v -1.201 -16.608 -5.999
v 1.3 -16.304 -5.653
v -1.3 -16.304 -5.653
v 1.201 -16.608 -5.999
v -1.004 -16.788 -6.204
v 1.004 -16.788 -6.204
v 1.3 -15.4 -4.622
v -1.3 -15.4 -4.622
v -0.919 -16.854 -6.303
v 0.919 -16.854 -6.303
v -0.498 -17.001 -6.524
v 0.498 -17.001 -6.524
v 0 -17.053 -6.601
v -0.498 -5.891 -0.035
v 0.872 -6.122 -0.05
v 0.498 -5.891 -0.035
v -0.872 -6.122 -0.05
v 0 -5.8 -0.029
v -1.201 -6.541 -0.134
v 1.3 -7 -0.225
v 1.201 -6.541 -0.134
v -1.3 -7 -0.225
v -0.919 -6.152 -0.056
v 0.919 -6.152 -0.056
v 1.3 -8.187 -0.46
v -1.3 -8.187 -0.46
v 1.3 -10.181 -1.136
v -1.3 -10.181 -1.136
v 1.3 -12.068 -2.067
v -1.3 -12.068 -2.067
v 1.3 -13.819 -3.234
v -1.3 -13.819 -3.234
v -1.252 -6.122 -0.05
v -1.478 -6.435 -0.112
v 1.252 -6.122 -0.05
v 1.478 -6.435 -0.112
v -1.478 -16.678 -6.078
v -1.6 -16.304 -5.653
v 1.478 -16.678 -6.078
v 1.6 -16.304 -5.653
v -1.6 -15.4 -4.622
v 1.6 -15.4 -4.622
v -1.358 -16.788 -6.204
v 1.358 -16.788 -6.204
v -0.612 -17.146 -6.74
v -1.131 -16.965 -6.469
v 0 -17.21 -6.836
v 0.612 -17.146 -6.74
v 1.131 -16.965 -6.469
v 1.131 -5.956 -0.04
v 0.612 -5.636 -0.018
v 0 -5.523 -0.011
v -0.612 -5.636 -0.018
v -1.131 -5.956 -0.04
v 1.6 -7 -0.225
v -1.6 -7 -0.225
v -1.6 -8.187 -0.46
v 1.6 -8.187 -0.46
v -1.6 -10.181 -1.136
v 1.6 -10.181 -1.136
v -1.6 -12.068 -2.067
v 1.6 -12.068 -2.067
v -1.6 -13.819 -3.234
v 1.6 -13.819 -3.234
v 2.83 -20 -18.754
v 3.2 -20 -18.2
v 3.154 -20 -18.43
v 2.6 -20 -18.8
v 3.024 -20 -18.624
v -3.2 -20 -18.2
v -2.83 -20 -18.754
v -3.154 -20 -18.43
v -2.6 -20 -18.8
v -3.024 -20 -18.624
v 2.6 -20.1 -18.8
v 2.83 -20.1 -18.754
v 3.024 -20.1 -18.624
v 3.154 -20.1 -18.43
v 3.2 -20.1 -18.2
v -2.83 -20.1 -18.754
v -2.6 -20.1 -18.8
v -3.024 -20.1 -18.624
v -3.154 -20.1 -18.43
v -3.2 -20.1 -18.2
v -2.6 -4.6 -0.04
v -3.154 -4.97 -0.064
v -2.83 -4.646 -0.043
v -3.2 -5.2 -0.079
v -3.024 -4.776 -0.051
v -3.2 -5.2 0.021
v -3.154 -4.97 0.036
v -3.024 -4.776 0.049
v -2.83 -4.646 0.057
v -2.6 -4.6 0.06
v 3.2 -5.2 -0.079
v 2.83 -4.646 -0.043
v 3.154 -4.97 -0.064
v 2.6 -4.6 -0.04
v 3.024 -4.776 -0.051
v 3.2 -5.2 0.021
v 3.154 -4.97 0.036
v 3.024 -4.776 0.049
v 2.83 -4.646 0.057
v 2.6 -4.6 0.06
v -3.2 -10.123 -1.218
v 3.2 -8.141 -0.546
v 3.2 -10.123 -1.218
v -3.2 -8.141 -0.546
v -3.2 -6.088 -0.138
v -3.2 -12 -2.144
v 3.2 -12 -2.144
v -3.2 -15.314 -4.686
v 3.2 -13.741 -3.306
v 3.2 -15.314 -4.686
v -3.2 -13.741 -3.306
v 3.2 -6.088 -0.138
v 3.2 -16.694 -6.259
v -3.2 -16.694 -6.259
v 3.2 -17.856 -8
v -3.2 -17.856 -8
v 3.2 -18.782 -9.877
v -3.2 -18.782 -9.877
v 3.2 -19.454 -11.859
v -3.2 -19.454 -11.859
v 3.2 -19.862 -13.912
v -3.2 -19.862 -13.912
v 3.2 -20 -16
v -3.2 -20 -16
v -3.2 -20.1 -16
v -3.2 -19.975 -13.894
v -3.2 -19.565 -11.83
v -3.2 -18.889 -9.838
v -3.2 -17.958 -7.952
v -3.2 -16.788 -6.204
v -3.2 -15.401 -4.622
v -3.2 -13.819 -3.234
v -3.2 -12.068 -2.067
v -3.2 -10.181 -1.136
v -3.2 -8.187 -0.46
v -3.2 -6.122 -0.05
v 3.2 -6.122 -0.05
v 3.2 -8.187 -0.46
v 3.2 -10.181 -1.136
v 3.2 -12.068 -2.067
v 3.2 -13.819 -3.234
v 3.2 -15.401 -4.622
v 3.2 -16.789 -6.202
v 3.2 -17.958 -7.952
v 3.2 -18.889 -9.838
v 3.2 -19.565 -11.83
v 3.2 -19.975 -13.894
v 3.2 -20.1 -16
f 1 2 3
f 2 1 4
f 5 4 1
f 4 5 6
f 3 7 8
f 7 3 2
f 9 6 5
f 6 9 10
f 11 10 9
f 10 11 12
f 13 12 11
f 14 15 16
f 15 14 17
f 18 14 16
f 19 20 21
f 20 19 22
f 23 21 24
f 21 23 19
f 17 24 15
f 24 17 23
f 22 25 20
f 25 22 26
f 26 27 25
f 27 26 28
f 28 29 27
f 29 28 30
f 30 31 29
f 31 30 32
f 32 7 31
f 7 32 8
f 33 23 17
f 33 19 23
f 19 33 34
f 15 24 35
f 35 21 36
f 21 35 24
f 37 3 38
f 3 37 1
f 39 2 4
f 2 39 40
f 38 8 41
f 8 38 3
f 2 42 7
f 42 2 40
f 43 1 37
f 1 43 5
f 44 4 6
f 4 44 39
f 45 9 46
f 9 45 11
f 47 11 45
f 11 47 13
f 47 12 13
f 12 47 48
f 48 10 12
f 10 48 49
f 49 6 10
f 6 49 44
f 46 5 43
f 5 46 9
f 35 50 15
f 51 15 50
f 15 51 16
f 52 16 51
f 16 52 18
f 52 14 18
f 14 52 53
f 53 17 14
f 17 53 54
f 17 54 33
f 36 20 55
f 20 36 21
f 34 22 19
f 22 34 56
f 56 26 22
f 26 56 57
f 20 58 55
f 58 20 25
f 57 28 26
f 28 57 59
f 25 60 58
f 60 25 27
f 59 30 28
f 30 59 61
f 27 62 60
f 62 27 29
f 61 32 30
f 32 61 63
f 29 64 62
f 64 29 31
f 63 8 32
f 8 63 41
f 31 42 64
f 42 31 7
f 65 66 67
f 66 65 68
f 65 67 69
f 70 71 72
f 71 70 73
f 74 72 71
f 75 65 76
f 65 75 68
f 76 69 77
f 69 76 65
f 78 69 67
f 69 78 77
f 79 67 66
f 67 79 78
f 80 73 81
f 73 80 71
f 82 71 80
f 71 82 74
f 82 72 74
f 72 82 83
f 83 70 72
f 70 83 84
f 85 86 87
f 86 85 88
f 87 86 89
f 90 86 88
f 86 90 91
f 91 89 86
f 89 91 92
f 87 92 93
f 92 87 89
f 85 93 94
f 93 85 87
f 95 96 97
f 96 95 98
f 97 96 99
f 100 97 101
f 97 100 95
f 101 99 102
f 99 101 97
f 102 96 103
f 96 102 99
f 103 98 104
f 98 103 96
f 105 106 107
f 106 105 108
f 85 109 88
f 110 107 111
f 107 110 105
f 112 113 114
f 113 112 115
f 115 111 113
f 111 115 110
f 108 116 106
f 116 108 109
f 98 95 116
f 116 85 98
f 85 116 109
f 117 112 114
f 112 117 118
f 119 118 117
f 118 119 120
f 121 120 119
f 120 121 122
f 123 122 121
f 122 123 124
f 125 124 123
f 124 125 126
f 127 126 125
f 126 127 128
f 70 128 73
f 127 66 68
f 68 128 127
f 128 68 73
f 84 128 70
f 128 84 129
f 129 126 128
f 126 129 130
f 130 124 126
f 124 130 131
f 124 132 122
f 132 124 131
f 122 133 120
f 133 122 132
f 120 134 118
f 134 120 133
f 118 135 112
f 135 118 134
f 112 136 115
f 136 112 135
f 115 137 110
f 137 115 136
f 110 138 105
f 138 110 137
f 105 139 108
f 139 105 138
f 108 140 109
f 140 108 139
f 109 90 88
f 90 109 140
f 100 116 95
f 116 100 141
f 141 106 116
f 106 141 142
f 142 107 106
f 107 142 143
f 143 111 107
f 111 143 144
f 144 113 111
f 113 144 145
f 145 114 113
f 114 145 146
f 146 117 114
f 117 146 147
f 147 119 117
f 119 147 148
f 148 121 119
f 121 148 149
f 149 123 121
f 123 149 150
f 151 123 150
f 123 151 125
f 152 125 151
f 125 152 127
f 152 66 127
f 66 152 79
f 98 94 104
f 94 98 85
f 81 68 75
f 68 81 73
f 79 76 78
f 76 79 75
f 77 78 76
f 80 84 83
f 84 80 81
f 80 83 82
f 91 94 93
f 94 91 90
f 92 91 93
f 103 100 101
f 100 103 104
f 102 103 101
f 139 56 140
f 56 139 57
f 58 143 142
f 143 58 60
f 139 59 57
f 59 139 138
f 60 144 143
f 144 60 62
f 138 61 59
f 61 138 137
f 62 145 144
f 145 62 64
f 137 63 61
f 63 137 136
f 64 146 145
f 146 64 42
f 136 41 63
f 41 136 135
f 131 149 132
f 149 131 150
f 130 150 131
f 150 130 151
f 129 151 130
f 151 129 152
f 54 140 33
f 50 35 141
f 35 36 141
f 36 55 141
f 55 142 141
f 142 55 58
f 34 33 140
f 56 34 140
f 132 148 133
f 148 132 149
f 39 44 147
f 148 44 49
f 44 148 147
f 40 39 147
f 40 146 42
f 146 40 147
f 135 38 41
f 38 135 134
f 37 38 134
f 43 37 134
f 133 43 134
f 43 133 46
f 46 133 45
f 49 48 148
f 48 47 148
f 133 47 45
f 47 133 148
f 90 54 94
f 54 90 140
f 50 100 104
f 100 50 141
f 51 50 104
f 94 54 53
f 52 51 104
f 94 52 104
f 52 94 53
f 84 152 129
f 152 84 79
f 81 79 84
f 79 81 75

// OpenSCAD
// file: ../p/1-4cyli.scad
use <../lib.scad>
function ldraw_lib__1_4cyli() = [
// 0 Cylinder 0.25
// 0 Name: 1-4cyli.dat
// 0 Author: James Jessiman
// 0 !LDRAW_ORG Primitive UPDATE 2012-01
// 0 !LICENSE Licensed under CC BY 4.0 : see CAreadme.txt
// 
// 0 BFC CERTIFY CCW
  [0,"BFC","CERTIFY"],
  [0,"BFC","CCW"],
// 
// 0 !HISTORY 2002-03-23 [sbliss] Added BFC statement.
// 0 !HISTORY 2002-04-25 [PTadmin] Official Update 2002-02
// 0 !HISTORY 2007-06-22 [PTadmin] Header formatted for Contributor Agreement
// 0 !HISTORY 2008-07-01 [PTadmin] Official Update 2008-01
// 0 !HISTORY 2012-02-16 [Philo] Changed to CCW
// 0 !HISTORY 2012-03-30 [PTadmin] Official Update 2012-01
// 
// 
// 4 16 1 1 0 0.9239 1 0.3827 0.9239 0 0.3827 1 0 0
  [4,16,1,1,0,0.9239,1,0.3827,0.9239,0,0.3827,1,0,0],
// 5 24 1 0 0 1 1 0 0.9239 0 0.3827 1 0 -1
  [5,24,1,0,0,1,1,0,0.9239,0,0.3827,1,0,-1],
// 4 16 0.9239 1 0.3827 0.7071 1 0.7071 0.7071 0 0.7071 0.9239 0 0.3827
  [4,16,0.9239,1,0.3827,0.7071,1,0.7071,0.7071,0,0.7071,0.9239,0,0.3827],
// 5 24 0.9239 0 0.3827 0.9239 1 0.3827 0.7071 0 0.7071 1 0 0
  [5,24,0.9239,0,0.3827,0.9239,1,0.3827,0.7071,0,0.7071,1,0,0],
// 4 16 0.7071 1 0.7071 0.3827 1 0.9239 0.3827 0 0.9239 0.7071 0 0.7071
  [4,16,0.7071,1,0.7071,0.3827,1,0.9239,0.3827,0,0.9239,0.7071,0,0.7071],
// 5 24 0.7071 0 0.7071 0.7071 1 0.7071 0.3827 0 0.9239 0.9239 0 0.3827
  [5,24,0.7071,0,0.7071,0.7071,1,0.7071,0.3827,0,0.9239,0.9239,0,0.3827],
// 4 16 0.3827 1 0.9239 0 1 1 0 0 1 0.3827 0 0.9239
  [4,16,0.3827,1,0.9239,0,1,1,0,0,1,0.3827,0,0.9239],
// 5 24 0.3827 0 0.9239 0.3827 1 0.9239 0 0 1 0.7071 0 0.7071
  [5,24,0.3827,0,0.9239,0.3827,1,0.9239,0,0,1,0.7071,0,0.7071],
// 5 24 0 0 1 0 1 1 0.3827 0 0.9239 -1 0 1
  [5,24,0,0,1,0,1,1,0.3827,0,0.9239,-1,0,1],
];
module ldraw_lib__1_4cyli(step=0, col=false, unit=2/5, alt=false, line=0.2, solid=!$preview)
    makepoly(ldraw_lib__1_4cyli(), step=step, col=col, unit=unit, alt=alt, line=line, solid=solid);
ldraw_lib__1_4cyli(line=0.2);
// file: ../p/1-4chrd.scad
use <../lib.scad>
function ldraw_lib__1_4chrd() = [
// 0 Chord 0.25
// 0 Name: 1-4chrd.dat
// 0 Author: Max Martin Richter [MMR1988]
// 0 !LDRAW_ORG Primitive UPDATE 2023-05
// 0 !LICENSE Licensed under CC BY 4.0 : see CAreadme.txt
// 
// 0 BFC CERTIFY CCW
  [0,"BFC","CERTIFY"],
  [0,"BFC","CCW"],
// 
// 0 !HISTORY 2004-04-22 [PTadmin] Official Update 2004-02
// 0 !HISTORY 2007-10-09 [PTadmin] Header formatted for Contributor Agreement
// 0 !HISTORY 2008-07-01 [PTadmin] Official Update 2008-01
// 0 !HISTORY 2012-08-02 [MMR1988] Re-creation with PrimGen2 and Rectifier
// 0 !HISTORY 2012-08-09 [PTadmin] Official Update 2012-02
// 0 !HISTORY 2023-10-27 [OrionP] Change author to MMR1988 from hafhead
// 0 !HISTORY 2023-10-31 [OrionP] Official Update 2023-05
// 
// 4 16 0.9239 0 0.3827 0.3827 0 0.9239 0 0 1 1 0 0
  [4,16,0.9239,0,0.3827,0.3827,0,0.9239,0,0,1,1,0,0],
// 3 16 0.7071 0 0.7071 0.3827 0 0.9239 0.9239 0 0.3827
  [3,16,0.7071,0,0.7071,0.3827,0,0.9239,0.9239,0,0.3827],
];
module ldraw_lib__1_4chrd(step=0, col=false, unit=2/5, alt=false, line=0.2, solid=!$preview)
    makepoly(ldraw_lib__1_4chrd(), step=step, col=col, unit=unit, alt=alt, line=line, solid=solid);
ldraw_lib__1_4chrd(line=0.2);
// main file
use <../lib.scad>
use <../p/1-4chrd.scad>
use <s/6005b01.scad>
function ldraw_lib__6347356rc01() = [
// 0 Sticker  0.8 x  3.3 with Black Rounded Rectangle with Dark Bluish Grey Border (Formed)
// 0 Name: 6347356rc01.dat
// 0 Author: Evert-Jan Boer [ejboer]
// 0 !LDRAW_ORG Part UPDATE 2026-08
// 0 !LICENSE Licensed under CC BY 4.0 : see CAreadme.txt
// 
// 0 BFC CERTIFY CCW
  [0,"BFC","CERTIFY"],
  [0,"BFC","CCW"],
// 
// 0 !CATEGORY Sticker
// 0 !KEYWORDS BrickLink 75309stk01, Brickowl 1001328, Rebrickable 78793
// 0 !KEYWORDS Republic Gunship, Set 75309, Star Wars
// 
// 0 !HISTORY 2026-08-31 [OrionP] Official Update 2026-08
// 
// 0 BFC NOCLIP
  [0,"BFC","NOCLIP"],
// 
// 4 0 -3.003 14.997 -41.519 3.003 14.997 -41.519 3.25 14.132 -40.76 -3.25 14.132 -40.76
  [4,0,-3.003,14.997,-41.519,3.003,14.997,-41.519,3.25,14.132,-40.76,-3.25,14.132,-40.76],
// 4 0 3.003 14.997 -41.519 -3.003 14.997 -41.519 -2.51 15.509 -41.97 2.51 15.509 -41.97
  [4,0,3.003,14.997,-41.519,-3.003,14.997,-41.519,-2.51,15.509,-41.97,2.51,15.509,-41.97],
// 4 0 -3.25 11.555 -38.499 -3.25 14.132 -40.76 3.25 14.132 -40.76 3.25 11.555 -38.499
  [4,0,-3.25,11.555,-38.499,-3.25,14.132,-40.76,3.25,14.132,-40.76,3.25,11.555,-38.499],
// 4 0 -2.51 15.509 -41.97 -2.298 15.757 -42.135 2.298 15.757 -42.135 2.51 15.509 -41.97
  [4,0,-2.51,15.509,-41.97,-2.298,15.757,-42.135,2.298,15.757,-42.135,2.51,15.509,-41.97],
// 4 0 -1.244 16.309 -42.503 1.244 16.309 -42.503 2.298 15.757 -42.135 -2.298 15.757 -42.135
  [4,0,-1.244,16.309,-42.503,1.244,16.309,-42.503,2.298,15.757,-42.135,-2.298,15.757,-42.135],
// 3 0 0 16.502 -42.633 1.244 16.309 -42.503 -1.244 16.309 -42.503
  [3,0,0,16.502,-42.633,1.244,16.309,-42.503,-1.244,16.309,-42.503],
// 4 0 2.18 .126 -15.306 1.244 .088 -14.728 -1.244 .088 -14.728 -2.18 .126 -15.306
  [4,0,2.18,.126,-15.306,1.244,.088,-14.728,-1.244,.088,-14.728,-2.18,.126,-15.306],
// 3 0 0 .073 -14.5 -1.244 .088 -14.728 1.244 .088 -14.728
  [3,0,0,.073,-14.5,-1.244,.088,-14.728,1.244,.088,-14.728],
// 4 0 3.003 .334 -16.352 -3.003 .334 -16.352 -3.25 .562 -17.5 3.25 .562 -17.5
  [4,0,3.003,.334,-16.352,-3.003,.334,-16.352,-3.25,.562,-17.5,3.25,.562,-17.5],
// 4 0 2.298 .14 -15.379 -2.298 .14 -15.379 -3.003 .334 -16.352 3.003 .334 -16.352
  [4,0,2.298,.14,-15.379,-2.298,.14,-15.379,-3.003,.334,-16.352,3.003,.334,-16.352],
// 4 0 -2.298 .14 -15.379 2.298 .14 -15.379 2.18 .126 -15.306 -2.18 .126 -15.306
  [4,0,-2.298,.14,-15.379,2.298,.14,-15.379,2.18,.126,-15.306,-2.18,.126,-15.306],
// 4 0 3.25 .562 -17.5 -3.25 .562 -17.5 -3.25 1.151 -20.468 3.25 1.151 -20.468
  [4,0,3.25,.562,-17.5,-3.25,.562,-17.5,-3.25,1.151,-20.468,3.25,1.151,-20.468],
// 4 0 -3.25 2.839 -25.452 3.25 2.839 -25.452 3.25 1.151 -20.468 -3.25 1.151 -20.468
  [4,0,-3.25,2.839,-25.452,3.25,2.839,-25.452,3.25,1.151,-20.468,-3.25,1.151,-20.468],
// 4 0 -3.25 5.167 -30.17 3.25 5.167 -30.17 3.25 2.839 -25.452 -3.25 2.839 -25.452
  [4,0,-3.25,5.167,-30.17,3.25,5.167,-30.17,3.25,2.839,-25.452,-3.25,2.839,-25.452],
// 4 0 -3.25 8.085 -34.547 3.25 8.085 -34.547 3.25 5.167 -30.17 -3.25 5.167 -30.17
  [4,0,-3.25,8.085,-34.547,3.25,8.085,-34.547,3.25,5.167,-30.17,-3.25,5.167,-30.17],
// 4 0 -3.25 11.555 -38.499 3.25 11.555 -38.499 3.25 8.085 -34.547 -3.25 8.085 -34.547
  [4,0,-3.25,11.555,-38.499,3.25,11.555,-38.499,3.25,8.085,-34.547,-3.25,8.085,-34.547],
// 3 72 -3.13 .126 -15.306 -2.298 .14 -15.379 -2.18 .126 -15.306
  [3,72,-3.13,.126,-15.306,-2.298,.14,-15.379,-2.18,.126,-15.306],
// 4 72 -3.696 .281 -16.087 -3.003 .334 -16.352 -2.298 .14 -15.379 -3.13 .126 -15.306
  [4,72,-3.696,.281,-16.087,-3.003,.334,-16.352,-2.298,.14,-15.379,-3.13,.126,-15.306],
// 3 72 2.18 .126 -15.306 2.298 .14 -15.379 3.13 .126 -15.306
  [3,72,2.18,.126,-15.306,2.298,.14,-15.379,3.13,.126,-15.306],
// 4 72 2.298 .14 -15.379 3.003 .334 -16.352 3.696 .281 -16.087 3.13 .126 -15.306
  [4,72,2.298,.14,-15.379,3.003,.334,-16.352,3.696,.281,-16.087,3.13,.126,-15.306],
// 4 72 -4 14.132 -40.76 -3.696 15.196 -41.694 -3.003 14.997 -41.519 -3.25 14.132 -40.76
  [4,72,-4,14.132,-40.76,-3.696,15.196,-41.694,-3.003,14.997,-41.519,-3.25,14.132,-40.76],
// 4 72 3.003 14.997 -41.519 3.696 15.196 -41.694 4 14.132 -40.76 3.25 14.132 -40.76
  [4,72,3.003,14.997,-41.519,3.696,15.196,-41.694,4,14.132,-40.76,3.25,14.132,-40.76],
// 4 72 -4 11.555 -38.499 -4 14.132 -40.76 -3.25 14.132 -40.76 -3.25 11.555 -38.499
  [4,72,-4,11.555,-38.499,-4,14.132,-40.76,-3.25,14.132,-40.76,-3.25,11.555,-38.499],
// 4 72 3.25 14.132 -40.76 4 14.132 -40.76 4 11.555 -38.499 3.25 11.555 -38.499
  [4,72,3.25,14.132,-40.76,4,14.132,-40.76,4,11.555,-38.499,3.25,11.555,-38.499],
// 4 72 -3.696 15.196 -41.694 -3.394 15.509 -41.97 -2.51 15.509 -41.97 -3.003 14.997 -41.519
  [4,72,-3.696,15.196,-41.694,-3.394,15.509,-41.97,-2.51,15.509,-41.97,-3.003,14.997,-41.519],
// 4 72 3.696 15.196 -41.694 3.003 14.997 -41.519 2.51 15.509 -41.97 3.394 15.509 -41.97
  [4,72,3.696,15.196,-41.694,3.003,14.997,-41.519,2.51,15.509,-41.97,3.394,15.509,-41.97],
// 4 72 -2.828 16.172 -42.412 -1.531 16.851 -42.865 -1.244 16.309 -42.503 -2.298 15.757 -42.135
  [4,72,-2.828,16.172,-42.412,-1.531,16.851,-42.865,-1.244,16.309,-42.503,-2.298,15.757,-42.135],
// 4 72 -1.531 16.851 -42.865 0 17.089 -43.025 0 16.502 -42.633 -1.244 16.309 -42.503
  [4,72,-1.531,16.851,-42.865,0,17.089,-43.025,0,16.502,-42.633,-1.244,16.309,-42.503],
// 4 72 0 17.089 -43.025 1.531 16.851 -42.865 1.244 16.309 -42.503 0 16.502 -42.633
  [4,72,0,17.089,-43.025,1.531,16.851,-42.865,1.244,16.309,-42.503,0,16.502,-42.633],
// 4 72 1.531 16.851 -42.865 2.828 16.172 -42.412 2.298 15.757 -42.135 1.244 16.309 -42.503
  [4,72,1.531,16.851,-42.865,2.828,16.172,-42.412,2.298,15.757,-42.135,1.244,16.309,-42.503],
// 4 72 2.51 15.509 -41.97 2.298 15.757 -42.135 2.828 16.172 -42.412 3.394 15.509 -41.97
  [4,72,2.51,15.509,-41.97,2.298,15.757,-42.135,2.828,16.172,-42.412,3.394,15.509,-41.97],
// 4 72 -2.828 16.172 -42.412 -2.298 15.757 -42.135 -2.51 15.509 -41.97 -3.394 15.509 -41.97
  [4,72,-2.828,16.172,-42.412,-2.298,15.757,-42.135,-2.51,15.509,-41.97,-3.394,15.509,-41.97],
// 3 72 3.13 .126 -15.306 2.828 .099 -14.889 2.18 .126 -15.306
  [3,72,3.13,.126,-15.306,2.828,.099,-14.889,2.18,.126,-15.306],
// 4 72 2.828 .099 -14.889 1.531 .046 -14.089 1.244 .088 -14.728 2.18 .126 -15.306
  [4,72,2.828,.099,-14.889,1.531,.046,-14.089,1.244,.088,-14.728,2.18,.126,-15.306],
// 4 72 1.531 .046 -14.089 0 .027 -13.808 0 .073 -14.5 1.244 .088 -14.728
  [4,72,1.531,.046,-14.089,0,.027,-13.808,0,.073,-14.5,1.244,.088,-14.728],
// 4 72 0 .027 -13.808 -1.531 .046 -14.089 -1.244 .088 -14.728 0 .073 -14.5
  [4,72,0,.027,-13.808,-1.531,.046,-14.089,-1.244,.088,-14.728,0,.073,-14.5],
// 4 72 -1.531 .046 -14.089 -2.828 .099 -14.889 -2.18 .126 -15.306 -1.244 .088 -14.728
  [4,72,-1.531,.046,-14.089,-2.828,.099,-14.889,-2.18,.126,-15.306,-1.244,.088,-14.728],
// 3 72 -2.18 .126 -15.306 -2.828 .099 -14.889 -3.13 .126 -15.306
  [3,72,-2.18,.126,-15.306,-2.828,.099,-14.889,-3.13,.126,-15.306],
// 4 72 4 .562 -17.5 3.696 .281 -16.087 3.003 .334 -16.352 3.25 .562 -17.5
  [4,72,4,.562,-17.5,3.696,.281,-16.087,3.003,.334,-16.352,3.25,.562,-17.5],
// 4 72 -3.696 .281 -16.087 -4 .562 -17.5 -3.25 .562 -17.5 -3.003 .334 -16.352
  [4,72,-3.696,.281,-16.087,-4,.562,-17.5,-3.25,.562,-17.5,-3.003,.334,-16.352],
// 4 72 -3.25 .562 -17.5 -4 .562 -17.5 -4 1.151 -20.468 -3.25 1.151 -20.468
  [4,72,-3.25,.562,-17.5,-4,.562,-17.5,-4,1.151,-20.468,-3.25,1.151,-20.468],
// 4 72 4 1.151 -20.468 4 .562 -17.5 3.25 .562 -17.5 3.25 1.151 -20.468
  [4,72,4,1.151,-20.468,4,.562,-17.5,3.25,.562,-17.5,3.25,1.151,-20.468],
// 4 72 -4 2.839 -25.452 -3.25 2.839 -25.452 -3.25 1.151 -20.468 -4 1.151 -20.468
  [4,72,-4,2.839,-25.452,-3.25,2.839,-25.452,-3.25,1.151,-20.468,-4,1.151,-20.468],
// 4 72 3.25 2.839 -25.452 4 2.839 -25.452 4 1.151 -20.468 3.25 1.151 -20.468
  [4,72,3.25,2.839,-25.452,4,2.839,-25.452,4,1.151,-20.468,3.25,1.151,-20.468],
// 4 72 -4 5.167 -30.17 -3.25 5.167 -30.17 -3.25 2.839 -25.452 -4 2.839 -25.452
  [4,72,-4,5.167,-30.17,-3.25,5.167,-30.17,-3.25,2.839,-25.452,-4,2.839,-25.452],
// 4 72 3.25 5.167 -30.17 4 5.167 -30.17 4 2.839 -25.452 3.25 2.839 -25.452
  [4,72,3.25,5.167,-30.17,4,5.167,-30.17,4,2.839,-25.452,3.25,2.839,-25.452],
// 4 72 -4 8.085 -34.547 -3.25 8.085 -34.547 -3.25 5.167 -30.17 -4 5.167 -30.17
  [4,72,-4,8.085,-34.547,-3.25,8.085,-34.547,-3.25,5.167,-30.17,-4,5.167,-30.17],
// 4 72 3.25 8.085 -34.547 4 8.085 -34.547 4 5.167 -30.17 3.25 5.167 -30.17
  [4,72,3.25,8.085,-34.547,4,8.085,-34.547,4,5.167,-30.17,3.25,5.167,-30.17],
// 4 72 -4 11.555 -38.499 -3.25 11.555 -38.499 -3.25 8.085 -34.547 -4 8.085 -34.547
  [4,72,-4,11.555,-38.499,-3.25,11.555,-38.499,-3.25,8.085,-34.547,-4,8.085,-34.547],
// 4 72 3.25 11.555 -38.499 4 11.555 -38.499 4 8.085 -34.547 3.25 8.085 -34.547
  [4,72,3.25,11.555,-38.499,4,11.555,-38.499,4,8.085,-34.547,3.25,8.085,-34.547],
// 
// 0 BFC CLIP
  [0,"BFC","CLIP"],
// 
// 1 16 0 0 0 1 0 0 0 1 0 0 0 1 s\6005b01.dat
  [1,16,0,0,0,1,0,0,0,1,0,0,0,1, ldraw_lib__s__6005b01()],
// 
// 1 16 6.5 45.5 -50.25 0 0 1.5 1.5 0 0 0 1 0 1-4chrd.dat
  [1,16,6.5,45.5,-50.25,0,0,1.5,1.5,0,0,0,1,0, ldraw_lib__1_4chrd()],
// 1 16 -6.5 45.5 -50.25 0 0 -1.5 1.5 0 0 0 1 0 1-4chrd.dat
  [1,16,-6.5,45.5,-50.25,0,0,-1.5,1.5,0,0,0,1,0, ldraw_lib__1_4chrd()],
// 1 16 -6.5 -.052 -13 0 0 -1.5 -.0989 1 0 1.5 0 0 1-4chrd.dat
  [1,16,-6.5,-.052,-13,0,0,-1.5,-.0989,1,0,1.5,0,0, ldraw_lib__1_4chrd()],
// 1 16 6.5 -.052 -13 1.5 0 0 0 1 -.0989 0 0 1.5 1-4chrd.dat
  [1,16,6.5,-.052,-13,1.5,0,0,0,1,-.0989,0,0,1.5, ldraw_lib__1_4chrd()],
// 
// 4 16 -4 .562 -17.5 -8 .126 -15.306 -8 1.151 -20.468 -4 1.151 -20.468
  [4,16,-4,.562,-17.5,-8,.126,-15.306,-8,1.151,-20.468,-4,1.151,-20.468],
// 4 16 8 2.839 -25.452 8 1.151 -20.468 4 1.151 -20.468 4 2.839 -25.452
  [4,16,8,2.839,-25.452,8,1.151,-20.468,4,1.151,-20.468,4,2.839,-25.452],
// 4 16 -8 1.151 -20.468 -8 2.839 -25.452 -4 2.839 -25.452 -4 1.151 -20.468
  [4,16,-8,1.151,-20.468,-8,2.839,-25.452,-4,2.839,-25.452,-4,1.151,-20.468],
// 4 16 8 5.167 -30.17 8 2.839 -25.452 4 2.839 -25.452 4 5.167 -30.17
  [4,16,8,5.167,-30.17,8,2.839,-25.452,4,2.839,-25.452,4,5.167,-30.17],
// 4 16 -8 2.839 -25.452 -8 5.167 -30.17 -4 5.167 -30.17 -4 2.839 -25.452
  [4,16,-8,2.839,-25.452,-8,5.167,-30.17,-4,5.167,-30.17,-4,2.839,-25.452],
// 4 16 8 8.085 -34.547 8 5.167 -30.17 4 5.167 -30.17 4 8.085 -34.547
  [4,16,8,8.085,-34.547,8,5.167,-30.17,4,5.167,-30.17,4,8.085,-34.547],
// 4 16 -8 5.167 -30.17 -8 8.085 -34.547 -4 8.085 -34.547 -4 5.167 -30.17
  [4,16,-8,5.167,-30.17,-8,8.085,-34.547,-4,8.085,-34.547,-4,5.167,-30.17],
// 4 16 8 11.555 -38.502 8 8.085 -34.547 4 8.085 -34.547 4 11.555 -38.499
  [4,16,8,11.555,-38.502,8,8.085,-34.547,4,8.085,-34.547,4,11.555,-38.499],
// 4 16 -8 8.085 -34.547 -8 11.555 -38.502 -4 11.555 -38.499 -4 8.085 -34.547
  [4,16,-8,8.085,-34.547,-8,11.555,-38.502,-4,11.555,-38.499,-4,8.085,-34.547],
// 4 16 -8 29.576 -48.912 8 29.576 -48.912 8 24.595 -47.223 -8 24.595 -47.223
  [4,16,-8,29.576,-48.912,8,29.576,-48.912,8,24.595,-47.223,-8,24.595,-47.223],
// 4 16 -8 34.734 -49.938 8 34.734 -49.938 8 29.576 -48.912 -8 29.576 -48.912
  [4,16,-8,34.734,-49.938,8,34.734,-49.938,8,29.576,-48.912,-8,29.576,-48.912],
// 4 16 -8 40 -50.25 8 40 -50.25 8 34.734 -49.938 -8 34.734 -49.938
  [4,16,-8,40,-50.25,8,40,-50.25,8,34.734,-49.938,-8,34.734,-49.938],
// 3 16 -2.828 .099 -14.889 -8 .126 -15.306 -3.13 .126 -15.306
  [3,16,-2.828,.099,-14.889,-8,.126,-15.306,-3.13,.126,-15.306],
// 3 16 2.828 .099 -14.889 3.13 .126 -15.306 8 .126 -15.306
  [3,16,2.828,.099,-14.889,3.13,.126,-15.306,8,.126,-15.306],
// 3 16 3.13 .126 -15.306 3.696 .281 -16.087 8 .126 -15.306
  [3,16,3.13,.126,-15.306,3.696,.281,-16.087,8,.126,-15.306],
// 3 16 3.696 .281 -16.087 4 .562 -17.5 8 .126 -15.306
  [3,16,3.696,.281,-16.087,4,.562,-17.5,8,.126,-15.306],
// 4 16 8 1.151 -20.468 8 .126 -15.306 4 .562 -17.5 4 1.151 -20.468
  [4,16,8,1.151,-20.468,8,.126,-15.306,4,.562,-17.5,4,1.151,-20.468],
// 3 16 -3.696 .281 -16.087 -3.13 .126 -15.306 -8 .126 -15.306
  [3,16,-3.696,.281,-16.087,-3.13,.126,-15.306,-8,.126,-15.306],
// 3 16 -4 .562 -17.5 -3.696 .281 -16.087 -8 .126 -15.306
  [3,16,-4,.562,-17.5,-3.696,.281,-16.087,-8,.126,-15.306],
// 4 16 8 19.88 -44.894 -8 19.88 -44.894 -8 24.595 -47.223 8 24.595 -47.223
  [4,16,8,19.88,-44.894,-8,19.88,-44.894,-8,24.595,-47.223,8,24.595,-47.223],
// 3 16 3.696 15.196 -41.694 3.394 15.509 -41.97 8 15.506 -41.973
  [3,16,3.696,15.196,-41.694,3.394,15.509,-41.97,8,15.506,-41.973],
// 4 16 2.828 16.172 -42.412 8 19.88 -44.894 8 15.506 -41.973 3.394 15.509 -41.97
  [4,16,2.828,16.172,-42.412,8,19.88,-44.894,8,15.506,-41.973,3.394,15.509,-41.97],
// 3 16 4 14.132 -40.76 3.696 15.196 -41.694 8 15.506 -41.973
  [3,16,4,14.132,-40.76,3.696,15.196,-41.694,8,15.506,-41.973],
// 4 16 8 11.555 -38.502 4 11.555 -38.499 4 14.132 -40.76 8 15.506 -41.973
  [4,16,8,11.555,-38.502,4,11.555,-38.499,4,14.132,-40.76,8,15.506,-41.973],
// 4 16 -4 14.132 -40.76 -4 11.555 -38.499 -8 11.555 -38.502 -8 15.509 -41.97
  [4,16,-4,14.132,-40.76,-4,11.555,-38.499,-8,11.555,-38.502,-8,15.509,-41.97],
// 3 16 -3.696 15.196 -41.694 -4 14.132 -40.76 -8 15.509 -41.97
  [3,16,-3.696,15.196,-41.694,-4,14.132,-40.76,-8,15.509,-41.97],
// 3 16 -3.394 15.509 -41.97 -3.696 15.196 -41.694 -8 15.509 -41.97
  [3,16,-3.394,15.509,-41.97,-3.696,15.196,-41.694,-8,15.509,-41.97],
// 4 16 -8 15.509 -41.97 -8 19.88 -44.894 -2.828 16.172 -42.412 -3.394 15.509 -41.97
  [4,16,-8,15.509,-41.97,-8,19.88,-44.894,-2.828,16.172,-42.412,-3.394,15.509,-41.97],
// 3 16 -2.828 16.172 -42.412 -8 19.88 -44.894 -1.531 16.851 -42.865
  [3,16,-2.828,16.172,-42.412,-8,19.88,-44.894,-1.531,16.851,-42.865],
// 3 16 2.828 16.172 -42.412 1.531 16.851 -42.865 8 19.88 -44.894
  [3,16,2.828,16.172,-42.412,1.531,16.851,-42.865,8,19.88,-44.894],
// 3 16 1.531 16.851 -42.865 0 17.089 -43.025 8 19.88 -44.894
  [3,16,1.531,16.851,-42.865,0,17.089,-43.025,8,19.88,-44.894],
// 4 16 -1.531 16.851 -42.865 -8 19.88 -44.894 8 19.88 -44.894 0 17.089 -43.025
  [4,16,-1.531,16.851,-42.865,-8,19.88,-44.894,8,19.88,-44.894,0,17.089,-43.025],
// 
// 4 16 -8 -.052 -13 -8 .126 -15.306 -2.828 .099 -14.889 -6.5 -.151 -11.5
  [4,16,-8,-.052,-13,-8,.126,-15.306,-2.828,.099,-14.889,-6.5,-.151,-11.5],
// 4 16 8 .126 -15.306 8 -.052 -13 6.5 -.151 -11.5 2.828 .099 -14.889
  [4,16,8,.126,-15.306,8,-.052,-13,6.5,-.151,-11.5,2.828,.099,-14.889],
// 3 16 1.531 .046 -14.089 2.828 .099 -14.889 6.5 -.151 -11.5
  [3,16,1.531,.046,-14.089,2.828,.099,-14.889,6.5,-.151,-11.5],
// 3 16 -6.5 -.151 -11.5 -2.828 .099 -14.889 -1.531 .046 -14.089
  [3,16,-6.5,-.151,-11.5,-2.828,.099,-14.889,-1.531,.046,-14.089],
// 3 16 0 .027 -13.808 1.531 .046 -14.089 6.5 -.151 -11.5
  [3,16,0,.027,-13.808,1.531,.046,-14.089,6.5,-.151,-11.5],
// 4 16 -1.531 .046 -14.089 0 .027 -13.808 6.5 -.151 -11.5 -6.5 -.151 -11.5
  [4,16,-1.531,.046,-14.089,0,.027,-13.808,6.5,-.151,-11.5,-6.5,-.151,-11.5],
// 4 16 -8 40 -50.25 -8 45.5 -50.25 8 45.5 -50.25 8 40 -50.25
  [4,16,-8,40,-50.25,-8,45.5,-50.25,8,45.5,-50.25,8,40,-50.25],
// 4 16 -6.5 47 -50.25 6.5 47 -50.25 8 45.5 -50.25 -8 45.5 -50.25
  [4,16,-6.5,47,-50.25,6.5,47,-50.25,8,45.5,-50.25,-8,45.5,-50.25],
];
module ldraw_lib__6347356rc01(step=0, col=false, unit=2/5, alt=false, line=0.2, solid=!$preview)
    makepoly(ldraw_lib__6347356rc01(), step=step, col=col, unit=unit, alt=alt, line=line, solid=solid);
ldraw_lib__6347356rc01(line=0.2);
